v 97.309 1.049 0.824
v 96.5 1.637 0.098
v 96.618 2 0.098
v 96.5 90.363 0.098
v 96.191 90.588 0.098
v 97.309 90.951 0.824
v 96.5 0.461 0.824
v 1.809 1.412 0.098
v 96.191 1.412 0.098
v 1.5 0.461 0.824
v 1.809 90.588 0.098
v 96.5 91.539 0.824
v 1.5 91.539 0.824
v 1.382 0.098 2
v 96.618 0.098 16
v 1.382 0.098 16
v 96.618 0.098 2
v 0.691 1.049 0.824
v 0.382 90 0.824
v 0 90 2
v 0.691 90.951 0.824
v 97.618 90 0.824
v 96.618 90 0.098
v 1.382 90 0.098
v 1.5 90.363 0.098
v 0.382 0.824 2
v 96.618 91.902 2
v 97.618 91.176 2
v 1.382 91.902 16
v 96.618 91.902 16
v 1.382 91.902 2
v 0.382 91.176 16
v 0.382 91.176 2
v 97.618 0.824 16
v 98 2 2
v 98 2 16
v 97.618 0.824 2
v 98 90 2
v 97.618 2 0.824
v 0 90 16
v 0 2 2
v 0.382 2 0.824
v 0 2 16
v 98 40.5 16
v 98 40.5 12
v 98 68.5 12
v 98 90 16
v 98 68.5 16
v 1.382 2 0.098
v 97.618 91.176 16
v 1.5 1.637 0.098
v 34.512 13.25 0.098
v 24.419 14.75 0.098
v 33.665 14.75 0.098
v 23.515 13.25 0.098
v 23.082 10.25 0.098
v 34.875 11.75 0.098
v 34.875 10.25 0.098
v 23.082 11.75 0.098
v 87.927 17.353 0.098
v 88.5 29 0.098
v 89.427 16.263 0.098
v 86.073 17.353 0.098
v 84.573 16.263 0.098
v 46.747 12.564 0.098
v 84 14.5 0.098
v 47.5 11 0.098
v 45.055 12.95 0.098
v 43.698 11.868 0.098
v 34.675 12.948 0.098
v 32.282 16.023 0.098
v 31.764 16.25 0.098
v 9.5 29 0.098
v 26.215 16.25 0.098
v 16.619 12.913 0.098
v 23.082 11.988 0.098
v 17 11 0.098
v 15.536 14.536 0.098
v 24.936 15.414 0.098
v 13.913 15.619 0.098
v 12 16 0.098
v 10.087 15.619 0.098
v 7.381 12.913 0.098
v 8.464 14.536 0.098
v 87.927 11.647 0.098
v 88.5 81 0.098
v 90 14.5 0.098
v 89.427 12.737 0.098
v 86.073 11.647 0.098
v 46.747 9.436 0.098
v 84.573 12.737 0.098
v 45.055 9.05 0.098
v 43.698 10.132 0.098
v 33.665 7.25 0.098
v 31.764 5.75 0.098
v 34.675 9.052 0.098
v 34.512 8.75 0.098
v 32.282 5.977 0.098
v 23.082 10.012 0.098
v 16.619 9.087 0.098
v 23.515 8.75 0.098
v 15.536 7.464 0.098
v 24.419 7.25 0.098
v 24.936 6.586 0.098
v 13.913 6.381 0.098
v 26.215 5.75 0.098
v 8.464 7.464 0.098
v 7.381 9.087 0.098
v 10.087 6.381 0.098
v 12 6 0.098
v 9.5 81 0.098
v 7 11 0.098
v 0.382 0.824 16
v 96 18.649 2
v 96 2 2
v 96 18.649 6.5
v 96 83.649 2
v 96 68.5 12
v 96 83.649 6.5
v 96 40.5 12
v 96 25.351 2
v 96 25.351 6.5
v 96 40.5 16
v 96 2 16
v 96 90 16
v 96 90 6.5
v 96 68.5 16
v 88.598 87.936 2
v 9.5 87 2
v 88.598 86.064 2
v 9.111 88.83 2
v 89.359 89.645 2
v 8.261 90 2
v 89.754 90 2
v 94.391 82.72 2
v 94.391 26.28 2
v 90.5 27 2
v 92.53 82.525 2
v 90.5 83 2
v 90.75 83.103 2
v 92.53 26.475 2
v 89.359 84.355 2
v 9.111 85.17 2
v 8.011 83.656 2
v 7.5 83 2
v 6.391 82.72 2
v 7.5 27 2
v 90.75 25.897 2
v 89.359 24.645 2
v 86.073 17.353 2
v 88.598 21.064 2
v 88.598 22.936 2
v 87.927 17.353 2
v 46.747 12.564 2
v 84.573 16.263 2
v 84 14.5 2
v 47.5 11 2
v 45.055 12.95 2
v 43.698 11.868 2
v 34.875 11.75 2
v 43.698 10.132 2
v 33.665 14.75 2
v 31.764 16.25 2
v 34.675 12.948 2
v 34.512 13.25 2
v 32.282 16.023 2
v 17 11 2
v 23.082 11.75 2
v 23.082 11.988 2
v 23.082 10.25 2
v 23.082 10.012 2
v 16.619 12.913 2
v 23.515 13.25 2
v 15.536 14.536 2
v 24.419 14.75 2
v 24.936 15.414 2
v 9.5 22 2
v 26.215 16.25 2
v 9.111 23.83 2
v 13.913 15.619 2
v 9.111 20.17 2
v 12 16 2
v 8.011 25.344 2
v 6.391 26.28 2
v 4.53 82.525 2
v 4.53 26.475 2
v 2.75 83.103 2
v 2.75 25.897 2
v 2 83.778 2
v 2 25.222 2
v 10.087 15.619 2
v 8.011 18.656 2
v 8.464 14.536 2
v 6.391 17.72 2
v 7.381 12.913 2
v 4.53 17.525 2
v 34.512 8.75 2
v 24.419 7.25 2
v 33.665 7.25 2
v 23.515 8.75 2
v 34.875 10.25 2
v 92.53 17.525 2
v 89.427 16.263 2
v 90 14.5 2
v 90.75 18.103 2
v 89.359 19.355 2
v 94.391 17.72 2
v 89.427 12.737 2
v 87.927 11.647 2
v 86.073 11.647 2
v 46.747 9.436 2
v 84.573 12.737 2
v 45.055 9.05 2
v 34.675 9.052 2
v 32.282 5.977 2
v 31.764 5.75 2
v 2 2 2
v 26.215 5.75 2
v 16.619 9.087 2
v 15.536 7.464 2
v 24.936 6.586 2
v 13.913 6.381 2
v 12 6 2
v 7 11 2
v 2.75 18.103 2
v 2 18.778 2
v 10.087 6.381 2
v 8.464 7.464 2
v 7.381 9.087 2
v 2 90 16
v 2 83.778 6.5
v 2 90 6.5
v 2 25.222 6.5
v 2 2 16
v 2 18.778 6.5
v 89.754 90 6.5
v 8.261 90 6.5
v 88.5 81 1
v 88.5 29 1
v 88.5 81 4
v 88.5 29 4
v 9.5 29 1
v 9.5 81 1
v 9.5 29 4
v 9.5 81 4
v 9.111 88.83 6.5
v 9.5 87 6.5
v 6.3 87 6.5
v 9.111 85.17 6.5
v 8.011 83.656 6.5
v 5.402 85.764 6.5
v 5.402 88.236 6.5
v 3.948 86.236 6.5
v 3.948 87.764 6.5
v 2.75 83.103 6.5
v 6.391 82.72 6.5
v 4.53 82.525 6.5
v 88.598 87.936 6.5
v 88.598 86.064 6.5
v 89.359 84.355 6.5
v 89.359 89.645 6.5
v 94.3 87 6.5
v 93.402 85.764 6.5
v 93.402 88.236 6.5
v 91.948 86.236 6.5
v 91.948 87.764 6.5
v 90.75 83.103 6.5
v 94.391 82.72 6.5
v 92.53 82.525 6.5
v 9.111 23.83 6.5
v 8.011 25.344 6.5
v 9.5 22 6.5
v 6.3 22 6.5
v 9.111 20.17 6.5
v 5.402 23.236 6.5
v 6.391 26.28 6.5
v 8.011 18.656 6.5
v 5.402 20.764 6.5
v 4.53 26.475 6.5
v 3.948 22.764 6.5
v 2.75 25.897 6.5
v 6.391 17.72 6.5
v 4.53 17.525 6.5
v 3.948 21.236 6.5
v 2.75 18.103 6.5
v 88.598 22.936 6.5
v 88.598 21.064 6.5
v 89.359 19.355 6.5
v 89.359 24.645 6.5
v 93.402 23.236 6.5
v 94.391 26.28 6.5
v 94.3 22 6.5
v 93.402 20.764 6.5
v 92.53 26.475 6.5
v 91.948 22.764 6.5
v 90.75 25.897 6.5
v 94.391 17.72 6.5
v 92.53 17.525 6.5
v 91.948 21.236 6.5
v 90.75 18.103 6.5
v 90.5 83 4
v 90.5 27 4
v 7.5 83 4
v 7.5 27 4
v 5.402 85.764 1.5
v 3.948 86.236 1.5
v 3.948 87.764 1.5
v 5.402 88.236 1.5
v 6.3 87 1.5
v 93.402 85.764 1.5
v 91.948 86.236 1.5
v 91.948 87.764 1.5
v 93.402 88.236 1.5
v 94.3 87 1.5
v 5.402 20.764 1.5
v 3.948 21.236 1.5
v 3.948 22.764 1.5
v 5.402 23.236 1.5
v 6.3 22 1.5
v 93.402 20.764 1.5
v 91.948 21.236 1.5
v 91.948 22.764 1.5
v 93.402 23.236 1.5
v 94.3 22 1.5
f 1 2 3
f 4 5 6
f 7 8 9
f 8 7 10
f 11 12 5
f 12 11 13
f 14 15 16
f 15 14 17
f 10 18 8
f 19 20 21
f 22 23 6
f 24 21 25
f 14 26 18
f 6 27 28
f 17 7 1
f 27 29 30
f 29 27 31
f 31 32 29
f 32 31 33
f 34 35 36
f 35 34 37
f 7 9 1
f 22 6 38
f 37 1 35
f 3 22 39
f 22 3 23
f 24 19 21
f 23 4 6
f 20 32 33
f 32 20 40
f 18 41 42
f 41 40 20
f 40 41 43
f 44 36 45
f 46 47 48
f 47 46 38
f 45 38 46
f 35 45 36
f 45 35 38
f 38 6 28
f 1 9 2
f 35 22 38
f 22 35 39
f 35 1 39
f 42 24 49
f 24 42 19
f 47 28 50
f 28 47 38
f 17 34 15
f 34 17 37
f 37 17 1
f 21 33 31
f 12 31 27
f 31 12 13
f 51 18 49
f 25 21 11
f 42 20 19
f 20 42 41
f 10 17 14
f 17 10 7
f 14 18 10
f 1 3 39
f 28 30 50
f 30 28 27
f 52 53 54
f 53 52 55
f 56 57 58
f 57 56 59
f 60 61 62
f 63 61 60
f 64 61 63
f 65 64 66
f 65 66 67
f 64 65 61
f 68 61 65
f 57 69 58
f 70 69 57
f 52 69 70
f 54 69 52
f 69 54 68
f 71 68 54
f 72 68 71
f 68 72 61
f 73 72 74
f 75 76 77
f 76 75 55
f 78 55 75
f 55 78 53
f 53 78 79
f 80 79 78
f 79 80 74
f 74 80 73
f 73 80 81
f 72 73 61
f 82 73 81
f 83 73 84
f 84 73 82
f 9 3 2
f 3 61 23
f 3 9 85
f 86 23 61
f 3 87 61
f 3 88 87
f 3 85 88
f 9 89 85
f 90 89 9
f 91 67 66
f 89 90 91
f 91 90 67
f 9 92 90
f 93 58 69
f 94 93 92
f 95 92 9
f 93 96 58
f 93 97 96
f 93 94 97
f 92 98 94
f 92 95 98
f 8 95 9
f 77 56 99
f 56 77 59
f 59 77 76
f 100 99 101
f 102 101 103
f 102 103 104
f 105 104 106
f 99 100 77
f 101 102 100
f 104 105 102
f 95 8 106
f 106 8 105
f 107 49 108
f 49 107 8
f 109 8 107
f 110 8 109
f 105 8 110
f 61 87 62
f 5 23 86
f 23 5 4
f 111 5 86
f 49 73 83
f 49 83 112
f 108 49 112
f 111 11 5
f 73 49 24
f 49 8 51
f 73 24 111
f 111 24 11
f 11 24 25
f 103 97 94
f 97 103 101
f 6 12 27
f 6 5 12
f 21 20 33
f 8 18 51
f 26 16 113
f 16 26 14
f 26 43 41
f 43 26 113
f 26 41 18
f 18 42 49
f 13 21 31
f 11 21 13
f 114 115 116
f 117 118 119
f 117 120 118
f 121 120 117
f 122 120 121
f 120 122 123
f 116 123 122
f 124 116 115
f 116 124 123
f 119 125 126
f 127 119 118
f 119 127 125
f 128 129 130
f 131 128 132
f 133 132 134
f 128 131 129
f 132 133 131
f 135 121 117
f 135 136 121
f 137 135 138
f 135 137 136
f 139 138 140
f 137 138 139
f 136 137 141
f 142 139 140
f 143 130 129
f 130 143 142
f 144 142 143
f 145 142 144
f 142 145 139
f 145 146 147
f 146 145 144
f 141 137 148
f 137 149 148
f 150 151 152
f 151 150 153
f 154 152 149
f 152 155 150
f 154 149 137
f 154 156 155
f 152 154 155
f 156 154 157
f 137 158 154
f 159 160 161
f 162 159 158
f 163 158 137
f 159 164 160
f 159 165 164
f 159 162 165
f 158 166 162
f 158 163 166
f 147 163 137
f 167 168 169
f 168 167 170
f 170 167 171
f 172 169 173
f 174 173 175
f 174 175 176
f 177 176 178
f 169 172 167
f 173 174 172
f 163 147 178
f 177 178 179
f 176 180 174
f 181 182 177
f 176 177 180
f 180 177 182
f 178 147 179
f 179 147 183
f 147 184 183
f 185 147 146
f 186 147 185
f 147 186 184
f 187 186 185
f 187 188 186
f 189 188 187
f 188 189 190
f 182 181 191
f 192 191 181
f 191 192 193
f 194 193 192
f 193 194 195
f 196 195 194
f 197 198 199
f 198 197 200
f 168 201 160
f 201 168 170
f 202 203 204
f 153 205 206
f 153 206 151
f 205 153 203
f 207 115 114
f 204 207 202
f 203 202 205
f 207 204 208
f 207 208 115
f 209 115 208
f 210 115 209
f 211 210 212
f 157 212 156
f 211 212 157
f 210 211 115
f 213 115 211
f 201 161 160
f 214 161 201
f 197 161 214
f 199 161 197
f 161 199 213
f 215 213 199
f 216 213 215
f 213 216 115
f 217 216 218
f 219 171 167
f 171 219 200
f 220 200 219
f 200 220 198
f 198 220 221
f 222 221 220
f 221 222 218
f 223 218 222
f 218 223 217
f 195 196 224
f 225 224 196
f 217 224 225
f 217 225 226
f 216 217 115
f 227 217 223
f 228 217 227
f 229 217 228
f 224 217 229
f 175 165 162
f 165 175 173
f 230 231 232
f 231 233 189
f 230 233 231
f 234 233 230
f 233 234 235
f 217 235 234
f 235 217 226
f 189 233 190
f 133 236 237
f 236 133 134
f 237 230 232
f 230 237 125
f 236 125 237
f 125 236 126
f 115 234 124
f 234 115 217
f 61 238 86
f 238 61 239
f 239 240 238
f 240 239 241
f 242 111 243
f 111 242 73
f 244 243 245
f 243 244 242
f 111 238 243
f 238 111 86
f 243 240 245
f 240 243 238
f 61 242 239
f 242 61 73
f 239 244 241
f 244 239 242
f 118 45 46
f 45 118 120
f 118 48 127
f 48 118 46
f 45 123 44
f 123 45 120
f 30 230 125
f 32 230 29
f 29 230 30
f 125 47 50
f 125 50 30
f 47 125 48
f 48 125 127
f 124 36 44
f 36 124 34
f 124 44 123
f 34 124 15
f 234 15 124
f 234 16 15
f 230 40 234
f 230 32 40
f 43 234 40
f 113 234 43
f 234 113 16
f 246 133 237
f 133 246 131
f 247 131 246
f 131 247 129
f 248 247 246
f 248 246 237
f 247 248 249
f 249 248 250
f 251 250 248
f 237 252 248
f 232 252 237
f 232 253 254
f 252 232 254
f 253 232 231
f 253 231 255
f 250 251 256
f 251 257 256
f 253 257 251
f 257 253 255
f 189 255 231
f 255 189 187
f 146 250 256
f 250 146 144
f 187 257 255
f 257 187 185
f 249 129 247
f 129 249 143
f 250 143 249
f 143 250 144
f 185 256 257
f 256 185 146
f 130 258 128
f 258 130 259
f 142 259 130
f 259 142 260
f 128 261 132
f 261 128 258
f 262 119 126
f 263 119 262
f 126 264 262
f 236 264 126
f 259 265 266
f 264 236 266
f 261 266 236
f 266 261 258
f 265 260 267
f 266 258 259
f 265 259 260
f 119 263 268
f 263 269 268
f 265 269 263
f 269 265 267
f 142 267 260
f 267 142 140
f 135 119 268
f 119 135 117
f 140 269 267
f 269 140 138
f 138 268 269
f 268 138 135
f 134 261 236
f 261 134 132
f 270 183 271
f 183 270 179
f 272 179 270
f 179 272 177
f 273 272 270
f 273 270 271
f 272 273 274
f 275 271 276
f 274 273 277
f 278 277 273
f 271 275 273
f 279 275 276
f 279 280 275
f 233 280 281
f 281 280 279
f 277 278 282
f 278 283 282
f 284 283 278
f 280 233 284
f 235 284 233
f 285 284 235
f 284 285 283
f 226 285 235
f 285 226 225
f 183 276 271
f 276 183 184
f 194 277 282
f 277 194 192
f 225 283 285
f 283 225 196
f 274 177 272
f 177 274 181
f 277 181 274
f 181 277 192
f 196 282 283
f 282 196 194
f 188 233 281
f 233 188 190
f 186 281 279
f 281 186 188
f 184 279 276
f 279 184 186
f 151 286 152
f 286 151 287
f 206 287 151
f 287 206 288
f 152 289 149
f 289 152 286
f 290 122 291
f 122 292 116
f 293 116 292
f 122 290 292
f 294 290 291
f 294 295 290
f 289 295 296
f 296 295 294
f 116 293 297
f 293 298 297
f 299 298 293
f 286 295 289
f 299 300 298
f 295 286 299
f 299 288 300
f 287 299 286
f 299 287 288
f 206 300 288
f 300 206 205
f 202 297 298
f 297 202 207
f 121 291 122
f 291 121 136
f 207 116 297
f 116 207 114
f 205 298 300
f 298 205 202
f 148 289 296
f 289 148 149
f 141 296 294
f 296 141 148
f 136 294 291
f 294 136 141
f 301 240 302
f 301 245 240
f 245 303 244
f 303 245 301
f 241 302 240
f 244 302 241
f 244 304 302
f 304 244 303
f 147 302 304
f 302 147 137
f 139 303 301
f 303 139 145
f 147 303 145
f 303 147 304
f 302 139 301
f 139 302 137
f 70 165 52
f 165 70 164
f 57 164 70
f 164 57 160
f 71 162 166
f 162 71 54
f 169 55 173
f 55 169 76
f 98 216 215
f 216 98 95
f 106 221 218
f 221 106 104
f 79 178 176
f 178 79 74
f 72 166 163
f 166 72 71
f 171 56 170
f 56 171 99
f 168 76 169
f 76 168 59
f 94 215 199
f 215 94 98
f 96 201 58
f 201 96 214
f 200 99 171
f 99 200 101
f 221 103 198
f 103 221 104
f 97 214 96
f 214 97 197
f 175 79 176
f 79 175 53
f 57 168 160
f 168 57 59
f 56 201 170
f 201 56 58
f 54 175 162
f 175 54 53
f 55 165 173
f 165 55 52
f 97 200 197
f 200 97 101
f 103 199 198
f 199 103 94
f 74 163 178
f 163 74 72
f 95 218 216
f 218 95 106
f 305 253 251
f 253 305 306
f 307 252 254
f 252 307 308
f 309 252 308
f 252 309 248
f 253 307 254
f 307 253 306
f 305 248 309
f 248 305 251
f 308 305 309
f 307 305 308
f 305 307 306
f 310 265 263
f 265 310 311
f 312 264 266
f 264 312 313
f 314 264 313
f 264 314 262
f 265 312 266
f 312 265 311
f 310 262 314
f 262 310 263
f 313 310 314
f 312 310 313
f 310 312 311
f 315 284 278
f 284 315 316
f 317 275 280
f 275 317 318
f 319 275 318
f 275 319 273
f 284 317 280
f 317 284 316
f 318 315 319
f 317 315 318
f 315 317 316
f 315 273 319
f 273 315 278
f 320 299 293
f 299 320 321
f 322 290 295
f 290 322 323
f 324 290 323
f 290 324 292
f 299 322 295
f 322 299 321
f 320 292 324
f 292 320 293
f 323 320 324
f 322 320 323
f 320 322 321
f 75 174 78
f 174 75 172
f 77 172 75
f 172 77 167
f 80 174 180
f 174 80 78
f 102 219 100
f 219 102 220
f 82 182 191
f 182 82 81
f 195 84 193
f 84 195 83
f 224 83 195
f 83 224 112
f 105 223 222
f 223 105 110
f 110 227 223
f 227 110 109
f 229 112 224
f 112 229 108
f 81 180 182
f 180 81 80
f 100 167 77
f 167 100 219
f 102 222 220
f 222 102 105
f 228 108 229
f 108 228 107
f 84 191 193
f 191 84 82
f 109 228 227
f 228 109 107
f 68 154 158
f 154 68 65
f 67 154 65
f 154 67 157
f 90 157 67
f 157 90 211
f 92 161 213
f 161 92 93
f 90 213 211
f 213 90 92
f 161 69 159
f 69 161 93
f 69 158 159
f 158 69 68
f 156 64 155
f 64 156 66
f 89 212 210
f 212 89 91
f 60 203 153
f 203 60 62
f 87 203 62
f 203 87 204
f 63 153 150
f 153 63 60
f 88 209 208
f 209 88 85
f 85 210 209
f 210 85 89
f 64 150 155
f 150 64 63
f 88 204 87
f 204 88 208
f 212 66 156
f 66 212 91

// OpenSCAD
// ..............................
// Prusa i3 Things
// LCD Box_front
// Oktay Gülmez
// 02/07/2014
// GNU GPL v3
// ..............................

module box(){
difference(){
  union(){
    minkowski(){
         translate([2,2,2]) cube([94,88,15]);
       sphere(r=2, $fn=10);
    }
      
  }
 
     translate([2,2,2]) cube([94,88,15]);
   
 translate([9.5,29,0]) cube([79,52,15]);
  
   translate([95,40.5,12]) cube([5,28,5]);

   translate([0,0,16]) cube([100,100,5]);
}
}

module buzzer(){
 difference(){
     translate([0,0,0]) cylinder(h=3, r=6);
    translate([0,0,0]) cube([12,1.5,6], center=true);
    translate([0,3,0]) cube([12,1.5,6], center=true);
    translate([0,-3,0]) cube([12,1.5,6], center=true);
    translate([0,6,0]) cube([12,1.5,6], center=true);
    translate([0,-6,0]) cube([12,1.5,6], center=true);
 }
}

difference(){
  union(){
   box();
    translate([5,87,1]) cylinder(h=5.5, r=4.5);
    translate([93,87,1]) cylinder(h=5.5, r=4.5);
    translate([5,22,1]) cylinder(h=5.5, r=4.5);
    translate([93,22,1]) cylinder(h=5.5, r=4.5);

    translate([9.5,27,1]) cube([79,2,3]);
    translate([9.5,81,1]) cube([79,2,3]);
    translate([7.5,27,1]) cube([2,56,3]); 
    translate([88.5,27,1]) cube([2,56,3]);     
  }
  translate([5,87,1.5]) cylinder(h=6.5, r=1.3);
    translate([93,87,1.5]) cylinder(h=6.5, r=1.3);
    translate([5,22,1.5]) cylinder(h=6.5, r=1.3);
    translate([93,22,1.5]) cylinder(h=6.5, r=1.3);

  translate([12,11,0]) cylinder(h=6.5, r=5);
  translate([45.5,11,0]) cylinder(h=6.5, r=2);
  translate([87,14.5,0]) cylinder(h=6.5, r=3);
  
  translate([29,11,0]) buzzer();
}
